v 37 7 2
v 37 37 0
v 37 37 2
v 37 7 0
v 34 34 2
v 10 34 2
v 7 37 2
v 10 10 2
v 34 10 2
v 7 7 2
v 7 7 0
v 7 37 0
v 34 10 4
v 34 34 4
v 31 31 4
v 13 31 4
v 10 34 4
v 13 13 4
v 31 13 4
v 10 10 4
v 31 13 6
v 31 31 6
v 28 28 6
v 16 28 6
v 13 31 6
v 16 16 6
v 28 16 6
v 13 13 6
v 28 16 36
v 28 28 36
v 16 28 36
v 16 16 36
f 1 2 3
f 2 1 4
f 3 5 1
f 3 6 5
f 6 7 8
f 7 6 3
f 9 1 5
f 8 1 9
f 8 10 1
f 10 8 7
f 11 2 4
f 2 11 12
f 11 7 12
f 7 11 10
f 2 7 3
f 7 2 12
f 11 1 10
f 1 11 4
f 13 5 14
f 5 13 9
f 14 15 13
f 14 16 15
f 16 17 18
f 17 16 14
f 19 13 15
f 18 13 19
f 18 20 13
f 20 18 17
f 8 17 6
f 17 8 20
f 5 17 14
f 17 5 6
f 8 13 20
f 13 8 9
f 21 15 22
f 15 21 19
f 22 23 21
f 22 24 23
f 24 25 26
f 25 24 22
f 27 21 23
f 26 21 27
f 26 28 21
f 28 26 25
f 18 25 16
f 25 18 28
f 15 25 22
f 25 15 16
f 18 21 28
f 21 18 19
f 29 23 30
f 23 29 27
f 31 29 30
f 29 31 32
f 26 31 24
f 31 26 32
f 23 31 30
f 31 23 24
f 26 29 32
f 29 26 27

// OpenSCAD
module chess_table()
union()
translate([7,7,0]){
    color ("SaddleBrown") {
cube([30,30,2]);
translate([3,3,2]) cube([24,24,2]);
translate([6,6,4]) cube([18,18,2]);
translate([9,9,6]) cube([12,12,30]);
    }
}
chess_table();
